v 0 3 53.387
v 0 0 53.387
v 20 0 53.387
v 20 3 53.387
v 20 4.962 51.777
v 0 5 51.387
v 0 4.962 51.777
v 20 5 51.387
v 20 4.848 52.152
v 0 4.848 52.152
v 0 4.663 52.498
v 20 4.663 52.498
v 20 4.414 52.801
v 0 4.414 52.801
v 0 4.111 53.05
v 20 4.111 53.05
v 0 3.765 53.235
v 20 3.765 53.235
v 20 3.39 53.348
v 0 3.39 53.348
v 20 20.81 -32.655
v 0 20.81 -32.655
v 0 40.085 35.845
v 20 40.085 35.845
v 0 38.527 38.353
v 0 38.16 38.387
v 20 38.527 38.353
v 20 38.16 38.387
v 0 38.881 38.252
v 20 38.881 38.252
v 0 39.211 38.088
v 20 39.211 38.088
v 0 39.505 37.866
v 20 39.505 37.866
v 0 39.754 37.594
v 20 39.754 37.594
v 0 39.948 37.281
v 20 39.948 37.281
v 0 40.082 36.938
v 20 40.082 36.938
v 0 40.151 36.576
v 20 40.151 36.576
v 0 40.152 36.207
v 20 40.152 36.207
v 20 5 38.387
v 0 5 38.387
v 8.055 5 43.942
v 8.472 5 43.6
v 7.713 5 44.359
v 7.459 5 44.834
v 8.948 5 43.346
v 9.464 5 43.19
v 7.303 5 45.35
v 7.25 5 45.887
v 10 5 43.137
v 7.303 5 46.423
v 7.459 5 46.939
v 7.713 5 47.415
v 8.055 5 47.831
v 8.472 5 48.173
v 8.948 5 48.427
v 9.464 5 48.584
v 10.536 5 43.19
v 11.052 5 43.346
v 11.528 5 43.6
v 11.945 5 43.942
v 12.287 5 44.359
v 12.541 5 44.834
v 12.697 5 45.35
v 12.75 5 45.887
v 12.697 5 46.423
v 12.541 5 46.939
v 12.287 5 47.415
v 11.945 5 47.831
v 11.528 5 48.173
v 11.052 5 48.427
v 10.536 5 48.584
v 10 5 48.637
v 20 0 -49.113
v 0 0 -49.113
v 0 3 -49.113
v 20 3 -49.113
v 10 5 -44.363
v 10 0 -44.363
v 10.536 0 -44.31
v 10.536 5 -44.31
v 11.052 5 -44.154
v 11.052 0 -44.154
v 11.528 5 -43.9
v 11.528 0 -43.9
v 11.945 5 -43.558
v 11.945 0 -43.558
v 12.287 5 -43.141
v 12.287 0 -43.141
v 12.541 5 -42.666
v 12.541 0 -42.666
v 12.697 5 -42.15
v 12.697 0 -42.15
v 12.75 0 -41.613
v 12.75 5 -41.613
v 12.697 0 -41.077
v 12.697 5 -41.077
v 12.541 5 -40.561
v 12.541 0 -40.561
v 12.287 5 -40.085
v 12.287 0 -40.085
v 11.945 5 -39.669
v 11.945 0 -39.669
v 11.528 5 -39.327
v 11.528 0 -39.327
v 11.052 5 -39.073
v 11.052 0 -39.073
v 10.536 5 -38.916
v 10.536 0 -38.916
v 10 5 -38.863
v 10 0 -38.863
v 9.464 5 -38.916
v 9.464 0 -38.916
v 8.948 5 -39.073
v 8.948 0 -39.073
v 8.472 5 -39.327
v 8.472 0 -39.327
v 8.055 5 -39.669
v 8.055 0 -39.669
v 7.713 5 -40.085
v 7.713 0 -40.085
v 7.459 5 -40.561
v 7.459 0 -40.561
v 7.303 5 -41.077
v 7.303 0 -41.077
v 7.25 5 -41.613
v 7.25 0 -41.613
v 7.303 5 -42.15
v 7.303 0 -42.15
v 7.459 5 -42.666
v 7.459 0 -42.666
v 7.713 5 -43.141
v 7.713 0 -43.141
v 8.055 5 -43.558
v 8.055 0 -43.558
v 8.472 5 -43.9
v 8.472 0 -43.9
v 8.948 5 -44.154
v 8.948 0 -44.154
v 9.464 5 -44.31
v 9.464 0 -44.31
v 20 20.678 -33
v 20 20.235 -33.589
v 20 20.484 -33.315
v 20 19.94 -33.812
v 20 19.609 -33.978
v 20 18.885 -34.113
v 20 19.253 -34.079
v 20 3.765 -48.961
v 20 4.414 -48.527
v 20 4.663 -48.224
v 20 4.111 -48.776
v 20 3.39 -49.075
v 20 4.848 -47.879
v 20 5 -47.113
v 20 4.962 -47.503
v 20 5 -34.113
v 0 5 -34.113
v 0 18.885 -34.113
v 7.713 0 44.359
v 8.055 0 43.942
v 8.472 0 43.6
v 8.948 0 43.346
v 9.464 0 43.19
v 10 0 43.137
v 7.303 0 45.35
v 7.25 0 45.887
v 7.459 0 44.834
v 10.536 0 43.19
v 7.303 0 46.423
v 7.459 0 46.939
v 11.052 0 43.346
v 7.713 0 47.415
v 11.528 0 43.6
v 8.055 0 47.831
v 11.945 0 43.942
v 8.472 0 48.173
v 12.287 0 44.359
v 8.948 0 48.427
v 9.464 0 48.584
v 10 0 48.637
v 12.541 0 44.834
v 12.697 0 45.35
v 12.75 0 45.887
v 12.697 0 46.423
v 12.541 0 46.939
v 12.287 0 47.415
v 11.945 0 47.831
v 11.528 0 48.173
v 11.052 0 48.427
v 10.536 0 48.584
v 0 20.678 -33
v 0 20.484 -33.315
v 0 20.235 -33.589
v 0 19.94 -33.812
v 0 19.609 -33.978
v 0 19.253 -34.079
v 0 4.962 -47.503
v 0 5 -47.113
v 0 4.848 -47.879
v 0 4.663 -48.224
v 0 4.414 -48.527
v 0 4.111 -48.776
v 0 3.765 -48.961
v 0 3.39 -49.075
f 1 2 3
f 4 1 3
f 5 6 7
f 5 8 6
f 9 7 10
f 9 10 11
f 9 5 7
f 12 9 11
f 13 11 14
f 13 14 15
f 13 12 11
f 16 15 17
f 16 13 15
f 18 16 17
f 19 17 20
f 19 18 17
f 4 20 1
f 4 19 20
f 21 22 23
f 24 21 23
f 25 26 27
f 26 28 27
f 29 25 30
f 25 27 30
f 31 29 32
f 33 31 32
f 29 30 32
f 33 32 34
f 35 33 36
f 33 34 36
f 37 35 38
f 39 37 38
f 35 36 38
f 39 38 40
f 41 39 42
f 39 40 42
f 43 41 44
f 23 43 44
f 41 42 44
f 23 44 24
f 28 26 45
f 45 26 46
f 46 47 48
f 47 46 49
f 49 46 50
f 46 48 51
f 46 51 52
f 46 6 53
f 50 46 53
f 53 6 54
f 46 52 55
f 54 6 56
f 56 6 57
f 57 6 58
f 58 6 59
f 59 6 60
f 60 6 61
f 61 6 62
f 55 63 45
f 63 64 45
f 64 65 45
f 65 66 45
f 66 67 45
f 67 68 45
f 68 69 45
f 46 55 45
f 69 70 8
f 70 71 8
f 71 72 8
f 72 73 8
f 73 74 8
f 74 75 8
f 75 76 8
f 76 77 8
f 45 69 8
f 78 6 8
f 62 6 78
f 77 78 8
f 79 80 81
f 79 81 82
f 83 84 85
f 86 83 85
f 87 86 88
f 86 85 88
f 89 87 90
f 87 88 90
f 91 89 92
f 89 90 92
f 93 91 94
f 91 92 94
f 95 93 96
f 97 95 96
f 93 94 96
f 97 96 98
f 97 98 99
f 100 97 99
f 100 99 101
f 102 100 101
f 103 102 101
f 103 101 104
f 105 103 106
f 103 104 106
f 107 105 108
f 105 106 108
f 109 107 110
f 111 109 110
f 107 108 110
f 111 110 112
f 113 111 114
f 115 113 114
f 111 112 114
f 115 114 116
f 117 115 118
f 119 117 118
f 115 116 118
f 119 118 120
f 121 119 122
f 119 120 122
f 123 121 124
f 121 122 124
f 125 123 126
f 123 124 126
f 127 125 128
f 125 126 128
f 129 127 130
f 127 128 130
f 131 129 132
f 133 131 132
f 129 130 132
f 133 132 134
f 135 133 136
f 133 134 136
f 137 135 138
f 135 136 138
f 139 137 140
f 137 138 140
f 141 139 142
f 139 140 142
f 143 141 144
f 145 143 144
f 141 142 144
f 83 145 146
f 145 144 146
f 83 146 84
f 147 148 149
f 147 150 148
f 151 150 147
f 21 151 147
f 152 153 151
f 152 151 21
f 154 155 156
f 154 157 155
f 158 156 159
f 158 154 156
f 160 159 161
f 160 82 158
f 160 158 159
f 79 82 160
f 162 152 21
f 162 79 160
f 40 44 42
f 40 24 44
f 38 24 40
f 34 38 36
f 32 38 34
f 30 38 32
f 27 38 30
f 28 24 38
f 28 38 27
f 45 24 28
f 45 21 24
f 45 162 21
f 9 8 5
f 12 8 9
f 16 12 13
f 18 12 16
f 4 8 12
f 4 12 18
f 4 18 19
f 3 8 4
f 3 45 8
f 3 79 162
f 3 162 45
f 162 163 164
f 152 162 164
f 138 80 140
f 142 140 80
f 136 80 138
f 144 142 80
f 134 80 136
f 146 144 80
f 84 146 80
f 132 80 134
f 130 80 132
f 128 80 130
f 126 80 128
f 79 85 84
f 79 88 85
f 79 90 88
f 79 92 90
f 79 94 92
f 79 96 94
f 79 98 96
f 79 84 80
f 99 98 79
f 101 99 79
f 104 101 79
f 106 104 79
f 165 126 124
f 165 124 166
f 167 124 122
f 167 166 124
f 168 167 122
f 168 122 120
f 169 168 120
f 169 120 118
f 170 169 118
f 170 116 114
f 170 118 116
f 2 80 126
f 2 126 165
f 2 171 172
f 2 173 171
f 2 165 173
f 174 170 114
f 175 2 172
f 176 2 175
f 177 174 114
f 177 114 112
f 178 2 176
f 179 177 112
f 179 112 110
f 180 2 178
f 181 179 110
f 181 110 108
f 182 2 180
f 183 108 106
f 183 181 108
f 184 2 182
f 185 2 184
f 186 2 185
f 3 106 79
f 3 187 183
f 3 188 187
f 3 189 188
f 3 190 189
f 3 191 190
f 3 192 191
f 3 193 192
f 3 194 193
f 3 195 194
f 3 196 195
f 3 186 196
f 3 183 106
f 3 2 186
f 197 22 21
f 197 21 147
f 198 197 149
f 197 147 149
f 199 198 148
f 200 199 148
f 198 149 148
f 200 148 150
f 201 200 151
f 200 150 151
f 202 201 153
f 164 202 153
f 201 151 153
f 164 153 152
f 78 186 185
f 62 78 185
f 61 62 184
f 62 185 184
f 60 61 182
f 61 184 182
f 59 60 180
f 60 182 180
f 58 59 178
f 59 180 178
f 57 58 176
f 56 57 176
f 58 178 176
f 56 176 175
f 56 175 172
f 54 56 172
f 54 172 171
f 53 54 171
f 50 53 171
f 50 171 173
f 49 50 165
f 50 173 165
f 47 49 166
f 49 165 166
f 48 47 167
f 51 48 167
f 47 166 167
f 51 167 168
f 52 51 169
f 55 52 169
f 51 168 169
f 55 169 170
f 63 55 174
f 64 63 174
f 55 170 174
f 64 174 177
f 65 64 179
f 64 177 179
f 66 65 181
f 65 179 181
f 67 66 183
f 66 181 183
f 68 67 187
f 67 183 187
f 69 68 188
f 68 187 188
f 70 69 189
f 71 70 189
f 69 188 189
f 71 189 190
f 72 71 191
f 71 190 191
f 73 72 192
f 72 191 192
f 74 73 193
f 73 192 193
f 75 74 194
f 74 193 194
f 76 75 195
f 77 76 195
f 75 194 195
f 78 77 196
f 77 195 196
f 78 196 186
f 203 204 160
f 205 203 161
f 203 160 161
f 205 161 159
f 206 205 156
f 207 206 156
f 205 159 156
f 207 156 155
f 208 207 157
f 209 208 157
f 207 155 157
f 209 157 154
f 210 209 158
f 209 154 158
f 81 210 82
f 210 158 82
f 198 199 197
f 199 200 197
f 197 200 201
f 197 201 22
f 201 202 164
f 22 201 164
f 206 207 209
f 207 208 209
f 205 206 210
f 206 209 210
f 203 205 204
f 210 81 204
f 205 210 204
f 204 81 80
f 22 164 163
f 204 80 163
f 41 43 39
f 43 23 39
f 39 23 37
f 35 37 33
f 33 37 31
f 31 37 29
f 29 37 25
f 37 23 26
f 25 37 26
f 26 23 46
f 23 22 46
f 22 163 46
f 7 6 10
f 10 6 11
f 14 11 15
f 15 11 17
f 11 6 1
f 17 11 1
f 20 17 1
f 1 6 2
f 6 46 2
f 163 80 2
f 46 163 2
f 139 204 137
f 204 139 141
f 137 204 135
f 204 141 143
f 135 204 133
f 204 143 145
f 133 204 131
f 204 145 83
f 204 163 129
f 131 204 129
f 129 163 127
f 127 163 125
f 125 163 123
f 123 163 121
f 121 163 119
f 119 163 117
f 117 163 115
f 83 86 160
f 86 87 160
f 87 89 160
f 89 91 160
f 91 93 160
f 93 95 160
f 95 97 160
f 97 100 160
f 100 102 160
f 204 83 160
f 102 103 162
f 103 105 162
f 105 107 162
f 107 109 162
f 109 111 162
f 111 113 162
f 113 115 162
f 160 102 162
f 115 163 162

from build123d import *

# Parameters (mm, degrees)
EXTRUDE_1_DEPTH = 20
SKETCH_2_W      = 20
SKETCH_2_H      = 15
SKETCH_2_R      = 2.75
EXTRUDE_2_DEPTH = 5
FILLET_1_R      = 2


with BuildPart() as part:
    # 草图1 → 凸台-拉伸1 (new body)
    with BuildSketch(Plane(origin=(0, 0, 0), x_dir=(0, 0, -1), z_dir=(1, 0, 0))):
        Polygon((-38.386760485, 40.8), (-38.386760485, 0), (34.113239515, 0), (34.113239515, 20.4), align=None)
    extrude(amount=EXTRUDE_1_DEPTH)

    # 草图2 → 凸台-拉伸2 (add)
    # profile 1 of 2: a face of its own
    with BuildSketch(Plane.XZ):
        with Locations((10, 45.886760485)):
            Rectangle(SKETCH_2_W, SKETCH_2_H)
        with Locations(Location((10, 45.886760485, 0), (0, 0, 90))):
            Circle(SKETCH_2_R, mode=Mode.SUBTRACT)
    # profile 2 of 2: a face of its own
    with BuildSketch(Plane.XZ):
        with Locations((10, -41.613239515)):
            Rectangle(SKETCH_2_W, SKETCH_2_H)
        with Locations(Location((10, -41.613239515, 0), (0, 0, 270))):
            Circle(SKETCH_2_R, mode=Mode.SUBTRACT)
    extrude(amount=-EXTRUDE_2_DEPTH)

    # 圆角1
    fillet_1_edges = [part.edges().sort_by_distance(p)[0] for p in [
        (10, 5, 53.386760485),
        (10, 5, -49.113239515),
        (10, 20.4, -34.113239515),
        (10, 40.8, 38.386760485),
    ]]
    fillet(fillet_1_edges, radius=FILLET_1_R)


solid = part.part
